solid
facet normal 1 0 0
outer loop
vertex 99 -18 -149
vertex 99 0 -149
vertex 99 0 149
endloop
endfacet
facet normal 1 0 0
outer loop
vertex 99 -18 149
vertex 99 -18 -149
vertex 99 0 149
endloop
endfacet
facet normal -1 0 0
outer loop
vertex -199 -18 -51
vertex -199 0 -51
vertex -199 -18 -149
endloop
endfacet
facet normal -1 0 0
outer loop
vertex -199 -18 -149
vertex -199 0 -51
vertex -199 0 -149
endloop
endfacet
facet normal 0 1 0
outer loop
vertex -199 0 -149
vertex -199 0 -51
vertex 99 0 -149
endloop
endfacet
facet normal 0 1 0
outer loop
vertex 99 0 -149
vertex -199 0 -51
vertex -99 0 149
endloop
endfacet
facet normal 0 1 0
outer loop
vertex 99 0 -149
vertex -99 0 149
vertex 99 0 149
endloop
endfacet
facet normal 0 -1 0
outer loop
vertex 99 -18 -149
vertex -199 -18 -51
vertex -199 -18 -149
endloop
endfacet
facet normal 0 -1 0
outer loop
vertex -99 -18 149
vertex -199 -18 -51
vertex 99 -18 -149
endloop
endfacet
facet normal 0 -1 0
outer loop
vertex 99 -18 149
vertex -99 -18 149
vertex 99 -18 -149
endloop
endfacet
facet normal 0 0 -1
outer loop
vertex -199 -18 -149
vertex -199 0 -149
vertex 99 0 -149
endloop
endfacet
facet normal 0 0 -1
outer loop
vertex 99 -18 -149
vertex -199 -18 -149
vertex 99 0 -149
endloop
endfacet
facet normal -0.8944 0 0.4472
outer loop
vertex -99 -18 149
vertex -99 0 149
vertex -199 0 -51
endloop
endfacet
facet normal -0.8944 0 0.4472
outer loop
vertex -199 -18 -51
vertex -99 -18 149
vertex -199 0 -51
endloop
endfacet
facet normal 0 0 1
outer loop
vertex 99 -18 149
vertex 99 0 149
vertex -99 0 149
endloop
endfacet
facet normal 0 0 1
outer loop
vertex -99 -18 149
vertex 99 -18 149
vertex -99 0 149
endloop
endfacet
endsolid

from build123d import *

# Parameters (mm, degrees)
F1_DEPTH = 18


with BuildPart() as f1:
    # F0 (on Front) → F1 (new body)
    with BuildSketch(Plane.XZ):
        Polygon((-199, -149), (-99, -149), (99, -149), (99, -51), (99, 149), (-99, 149), (-99, -51), (-199, -51), align=None)
        Polygon((-99, 149), (-199, -51), (-99, -51), align=None)
    extrude(amount=F1_DEPTH)


solid = f1.part
